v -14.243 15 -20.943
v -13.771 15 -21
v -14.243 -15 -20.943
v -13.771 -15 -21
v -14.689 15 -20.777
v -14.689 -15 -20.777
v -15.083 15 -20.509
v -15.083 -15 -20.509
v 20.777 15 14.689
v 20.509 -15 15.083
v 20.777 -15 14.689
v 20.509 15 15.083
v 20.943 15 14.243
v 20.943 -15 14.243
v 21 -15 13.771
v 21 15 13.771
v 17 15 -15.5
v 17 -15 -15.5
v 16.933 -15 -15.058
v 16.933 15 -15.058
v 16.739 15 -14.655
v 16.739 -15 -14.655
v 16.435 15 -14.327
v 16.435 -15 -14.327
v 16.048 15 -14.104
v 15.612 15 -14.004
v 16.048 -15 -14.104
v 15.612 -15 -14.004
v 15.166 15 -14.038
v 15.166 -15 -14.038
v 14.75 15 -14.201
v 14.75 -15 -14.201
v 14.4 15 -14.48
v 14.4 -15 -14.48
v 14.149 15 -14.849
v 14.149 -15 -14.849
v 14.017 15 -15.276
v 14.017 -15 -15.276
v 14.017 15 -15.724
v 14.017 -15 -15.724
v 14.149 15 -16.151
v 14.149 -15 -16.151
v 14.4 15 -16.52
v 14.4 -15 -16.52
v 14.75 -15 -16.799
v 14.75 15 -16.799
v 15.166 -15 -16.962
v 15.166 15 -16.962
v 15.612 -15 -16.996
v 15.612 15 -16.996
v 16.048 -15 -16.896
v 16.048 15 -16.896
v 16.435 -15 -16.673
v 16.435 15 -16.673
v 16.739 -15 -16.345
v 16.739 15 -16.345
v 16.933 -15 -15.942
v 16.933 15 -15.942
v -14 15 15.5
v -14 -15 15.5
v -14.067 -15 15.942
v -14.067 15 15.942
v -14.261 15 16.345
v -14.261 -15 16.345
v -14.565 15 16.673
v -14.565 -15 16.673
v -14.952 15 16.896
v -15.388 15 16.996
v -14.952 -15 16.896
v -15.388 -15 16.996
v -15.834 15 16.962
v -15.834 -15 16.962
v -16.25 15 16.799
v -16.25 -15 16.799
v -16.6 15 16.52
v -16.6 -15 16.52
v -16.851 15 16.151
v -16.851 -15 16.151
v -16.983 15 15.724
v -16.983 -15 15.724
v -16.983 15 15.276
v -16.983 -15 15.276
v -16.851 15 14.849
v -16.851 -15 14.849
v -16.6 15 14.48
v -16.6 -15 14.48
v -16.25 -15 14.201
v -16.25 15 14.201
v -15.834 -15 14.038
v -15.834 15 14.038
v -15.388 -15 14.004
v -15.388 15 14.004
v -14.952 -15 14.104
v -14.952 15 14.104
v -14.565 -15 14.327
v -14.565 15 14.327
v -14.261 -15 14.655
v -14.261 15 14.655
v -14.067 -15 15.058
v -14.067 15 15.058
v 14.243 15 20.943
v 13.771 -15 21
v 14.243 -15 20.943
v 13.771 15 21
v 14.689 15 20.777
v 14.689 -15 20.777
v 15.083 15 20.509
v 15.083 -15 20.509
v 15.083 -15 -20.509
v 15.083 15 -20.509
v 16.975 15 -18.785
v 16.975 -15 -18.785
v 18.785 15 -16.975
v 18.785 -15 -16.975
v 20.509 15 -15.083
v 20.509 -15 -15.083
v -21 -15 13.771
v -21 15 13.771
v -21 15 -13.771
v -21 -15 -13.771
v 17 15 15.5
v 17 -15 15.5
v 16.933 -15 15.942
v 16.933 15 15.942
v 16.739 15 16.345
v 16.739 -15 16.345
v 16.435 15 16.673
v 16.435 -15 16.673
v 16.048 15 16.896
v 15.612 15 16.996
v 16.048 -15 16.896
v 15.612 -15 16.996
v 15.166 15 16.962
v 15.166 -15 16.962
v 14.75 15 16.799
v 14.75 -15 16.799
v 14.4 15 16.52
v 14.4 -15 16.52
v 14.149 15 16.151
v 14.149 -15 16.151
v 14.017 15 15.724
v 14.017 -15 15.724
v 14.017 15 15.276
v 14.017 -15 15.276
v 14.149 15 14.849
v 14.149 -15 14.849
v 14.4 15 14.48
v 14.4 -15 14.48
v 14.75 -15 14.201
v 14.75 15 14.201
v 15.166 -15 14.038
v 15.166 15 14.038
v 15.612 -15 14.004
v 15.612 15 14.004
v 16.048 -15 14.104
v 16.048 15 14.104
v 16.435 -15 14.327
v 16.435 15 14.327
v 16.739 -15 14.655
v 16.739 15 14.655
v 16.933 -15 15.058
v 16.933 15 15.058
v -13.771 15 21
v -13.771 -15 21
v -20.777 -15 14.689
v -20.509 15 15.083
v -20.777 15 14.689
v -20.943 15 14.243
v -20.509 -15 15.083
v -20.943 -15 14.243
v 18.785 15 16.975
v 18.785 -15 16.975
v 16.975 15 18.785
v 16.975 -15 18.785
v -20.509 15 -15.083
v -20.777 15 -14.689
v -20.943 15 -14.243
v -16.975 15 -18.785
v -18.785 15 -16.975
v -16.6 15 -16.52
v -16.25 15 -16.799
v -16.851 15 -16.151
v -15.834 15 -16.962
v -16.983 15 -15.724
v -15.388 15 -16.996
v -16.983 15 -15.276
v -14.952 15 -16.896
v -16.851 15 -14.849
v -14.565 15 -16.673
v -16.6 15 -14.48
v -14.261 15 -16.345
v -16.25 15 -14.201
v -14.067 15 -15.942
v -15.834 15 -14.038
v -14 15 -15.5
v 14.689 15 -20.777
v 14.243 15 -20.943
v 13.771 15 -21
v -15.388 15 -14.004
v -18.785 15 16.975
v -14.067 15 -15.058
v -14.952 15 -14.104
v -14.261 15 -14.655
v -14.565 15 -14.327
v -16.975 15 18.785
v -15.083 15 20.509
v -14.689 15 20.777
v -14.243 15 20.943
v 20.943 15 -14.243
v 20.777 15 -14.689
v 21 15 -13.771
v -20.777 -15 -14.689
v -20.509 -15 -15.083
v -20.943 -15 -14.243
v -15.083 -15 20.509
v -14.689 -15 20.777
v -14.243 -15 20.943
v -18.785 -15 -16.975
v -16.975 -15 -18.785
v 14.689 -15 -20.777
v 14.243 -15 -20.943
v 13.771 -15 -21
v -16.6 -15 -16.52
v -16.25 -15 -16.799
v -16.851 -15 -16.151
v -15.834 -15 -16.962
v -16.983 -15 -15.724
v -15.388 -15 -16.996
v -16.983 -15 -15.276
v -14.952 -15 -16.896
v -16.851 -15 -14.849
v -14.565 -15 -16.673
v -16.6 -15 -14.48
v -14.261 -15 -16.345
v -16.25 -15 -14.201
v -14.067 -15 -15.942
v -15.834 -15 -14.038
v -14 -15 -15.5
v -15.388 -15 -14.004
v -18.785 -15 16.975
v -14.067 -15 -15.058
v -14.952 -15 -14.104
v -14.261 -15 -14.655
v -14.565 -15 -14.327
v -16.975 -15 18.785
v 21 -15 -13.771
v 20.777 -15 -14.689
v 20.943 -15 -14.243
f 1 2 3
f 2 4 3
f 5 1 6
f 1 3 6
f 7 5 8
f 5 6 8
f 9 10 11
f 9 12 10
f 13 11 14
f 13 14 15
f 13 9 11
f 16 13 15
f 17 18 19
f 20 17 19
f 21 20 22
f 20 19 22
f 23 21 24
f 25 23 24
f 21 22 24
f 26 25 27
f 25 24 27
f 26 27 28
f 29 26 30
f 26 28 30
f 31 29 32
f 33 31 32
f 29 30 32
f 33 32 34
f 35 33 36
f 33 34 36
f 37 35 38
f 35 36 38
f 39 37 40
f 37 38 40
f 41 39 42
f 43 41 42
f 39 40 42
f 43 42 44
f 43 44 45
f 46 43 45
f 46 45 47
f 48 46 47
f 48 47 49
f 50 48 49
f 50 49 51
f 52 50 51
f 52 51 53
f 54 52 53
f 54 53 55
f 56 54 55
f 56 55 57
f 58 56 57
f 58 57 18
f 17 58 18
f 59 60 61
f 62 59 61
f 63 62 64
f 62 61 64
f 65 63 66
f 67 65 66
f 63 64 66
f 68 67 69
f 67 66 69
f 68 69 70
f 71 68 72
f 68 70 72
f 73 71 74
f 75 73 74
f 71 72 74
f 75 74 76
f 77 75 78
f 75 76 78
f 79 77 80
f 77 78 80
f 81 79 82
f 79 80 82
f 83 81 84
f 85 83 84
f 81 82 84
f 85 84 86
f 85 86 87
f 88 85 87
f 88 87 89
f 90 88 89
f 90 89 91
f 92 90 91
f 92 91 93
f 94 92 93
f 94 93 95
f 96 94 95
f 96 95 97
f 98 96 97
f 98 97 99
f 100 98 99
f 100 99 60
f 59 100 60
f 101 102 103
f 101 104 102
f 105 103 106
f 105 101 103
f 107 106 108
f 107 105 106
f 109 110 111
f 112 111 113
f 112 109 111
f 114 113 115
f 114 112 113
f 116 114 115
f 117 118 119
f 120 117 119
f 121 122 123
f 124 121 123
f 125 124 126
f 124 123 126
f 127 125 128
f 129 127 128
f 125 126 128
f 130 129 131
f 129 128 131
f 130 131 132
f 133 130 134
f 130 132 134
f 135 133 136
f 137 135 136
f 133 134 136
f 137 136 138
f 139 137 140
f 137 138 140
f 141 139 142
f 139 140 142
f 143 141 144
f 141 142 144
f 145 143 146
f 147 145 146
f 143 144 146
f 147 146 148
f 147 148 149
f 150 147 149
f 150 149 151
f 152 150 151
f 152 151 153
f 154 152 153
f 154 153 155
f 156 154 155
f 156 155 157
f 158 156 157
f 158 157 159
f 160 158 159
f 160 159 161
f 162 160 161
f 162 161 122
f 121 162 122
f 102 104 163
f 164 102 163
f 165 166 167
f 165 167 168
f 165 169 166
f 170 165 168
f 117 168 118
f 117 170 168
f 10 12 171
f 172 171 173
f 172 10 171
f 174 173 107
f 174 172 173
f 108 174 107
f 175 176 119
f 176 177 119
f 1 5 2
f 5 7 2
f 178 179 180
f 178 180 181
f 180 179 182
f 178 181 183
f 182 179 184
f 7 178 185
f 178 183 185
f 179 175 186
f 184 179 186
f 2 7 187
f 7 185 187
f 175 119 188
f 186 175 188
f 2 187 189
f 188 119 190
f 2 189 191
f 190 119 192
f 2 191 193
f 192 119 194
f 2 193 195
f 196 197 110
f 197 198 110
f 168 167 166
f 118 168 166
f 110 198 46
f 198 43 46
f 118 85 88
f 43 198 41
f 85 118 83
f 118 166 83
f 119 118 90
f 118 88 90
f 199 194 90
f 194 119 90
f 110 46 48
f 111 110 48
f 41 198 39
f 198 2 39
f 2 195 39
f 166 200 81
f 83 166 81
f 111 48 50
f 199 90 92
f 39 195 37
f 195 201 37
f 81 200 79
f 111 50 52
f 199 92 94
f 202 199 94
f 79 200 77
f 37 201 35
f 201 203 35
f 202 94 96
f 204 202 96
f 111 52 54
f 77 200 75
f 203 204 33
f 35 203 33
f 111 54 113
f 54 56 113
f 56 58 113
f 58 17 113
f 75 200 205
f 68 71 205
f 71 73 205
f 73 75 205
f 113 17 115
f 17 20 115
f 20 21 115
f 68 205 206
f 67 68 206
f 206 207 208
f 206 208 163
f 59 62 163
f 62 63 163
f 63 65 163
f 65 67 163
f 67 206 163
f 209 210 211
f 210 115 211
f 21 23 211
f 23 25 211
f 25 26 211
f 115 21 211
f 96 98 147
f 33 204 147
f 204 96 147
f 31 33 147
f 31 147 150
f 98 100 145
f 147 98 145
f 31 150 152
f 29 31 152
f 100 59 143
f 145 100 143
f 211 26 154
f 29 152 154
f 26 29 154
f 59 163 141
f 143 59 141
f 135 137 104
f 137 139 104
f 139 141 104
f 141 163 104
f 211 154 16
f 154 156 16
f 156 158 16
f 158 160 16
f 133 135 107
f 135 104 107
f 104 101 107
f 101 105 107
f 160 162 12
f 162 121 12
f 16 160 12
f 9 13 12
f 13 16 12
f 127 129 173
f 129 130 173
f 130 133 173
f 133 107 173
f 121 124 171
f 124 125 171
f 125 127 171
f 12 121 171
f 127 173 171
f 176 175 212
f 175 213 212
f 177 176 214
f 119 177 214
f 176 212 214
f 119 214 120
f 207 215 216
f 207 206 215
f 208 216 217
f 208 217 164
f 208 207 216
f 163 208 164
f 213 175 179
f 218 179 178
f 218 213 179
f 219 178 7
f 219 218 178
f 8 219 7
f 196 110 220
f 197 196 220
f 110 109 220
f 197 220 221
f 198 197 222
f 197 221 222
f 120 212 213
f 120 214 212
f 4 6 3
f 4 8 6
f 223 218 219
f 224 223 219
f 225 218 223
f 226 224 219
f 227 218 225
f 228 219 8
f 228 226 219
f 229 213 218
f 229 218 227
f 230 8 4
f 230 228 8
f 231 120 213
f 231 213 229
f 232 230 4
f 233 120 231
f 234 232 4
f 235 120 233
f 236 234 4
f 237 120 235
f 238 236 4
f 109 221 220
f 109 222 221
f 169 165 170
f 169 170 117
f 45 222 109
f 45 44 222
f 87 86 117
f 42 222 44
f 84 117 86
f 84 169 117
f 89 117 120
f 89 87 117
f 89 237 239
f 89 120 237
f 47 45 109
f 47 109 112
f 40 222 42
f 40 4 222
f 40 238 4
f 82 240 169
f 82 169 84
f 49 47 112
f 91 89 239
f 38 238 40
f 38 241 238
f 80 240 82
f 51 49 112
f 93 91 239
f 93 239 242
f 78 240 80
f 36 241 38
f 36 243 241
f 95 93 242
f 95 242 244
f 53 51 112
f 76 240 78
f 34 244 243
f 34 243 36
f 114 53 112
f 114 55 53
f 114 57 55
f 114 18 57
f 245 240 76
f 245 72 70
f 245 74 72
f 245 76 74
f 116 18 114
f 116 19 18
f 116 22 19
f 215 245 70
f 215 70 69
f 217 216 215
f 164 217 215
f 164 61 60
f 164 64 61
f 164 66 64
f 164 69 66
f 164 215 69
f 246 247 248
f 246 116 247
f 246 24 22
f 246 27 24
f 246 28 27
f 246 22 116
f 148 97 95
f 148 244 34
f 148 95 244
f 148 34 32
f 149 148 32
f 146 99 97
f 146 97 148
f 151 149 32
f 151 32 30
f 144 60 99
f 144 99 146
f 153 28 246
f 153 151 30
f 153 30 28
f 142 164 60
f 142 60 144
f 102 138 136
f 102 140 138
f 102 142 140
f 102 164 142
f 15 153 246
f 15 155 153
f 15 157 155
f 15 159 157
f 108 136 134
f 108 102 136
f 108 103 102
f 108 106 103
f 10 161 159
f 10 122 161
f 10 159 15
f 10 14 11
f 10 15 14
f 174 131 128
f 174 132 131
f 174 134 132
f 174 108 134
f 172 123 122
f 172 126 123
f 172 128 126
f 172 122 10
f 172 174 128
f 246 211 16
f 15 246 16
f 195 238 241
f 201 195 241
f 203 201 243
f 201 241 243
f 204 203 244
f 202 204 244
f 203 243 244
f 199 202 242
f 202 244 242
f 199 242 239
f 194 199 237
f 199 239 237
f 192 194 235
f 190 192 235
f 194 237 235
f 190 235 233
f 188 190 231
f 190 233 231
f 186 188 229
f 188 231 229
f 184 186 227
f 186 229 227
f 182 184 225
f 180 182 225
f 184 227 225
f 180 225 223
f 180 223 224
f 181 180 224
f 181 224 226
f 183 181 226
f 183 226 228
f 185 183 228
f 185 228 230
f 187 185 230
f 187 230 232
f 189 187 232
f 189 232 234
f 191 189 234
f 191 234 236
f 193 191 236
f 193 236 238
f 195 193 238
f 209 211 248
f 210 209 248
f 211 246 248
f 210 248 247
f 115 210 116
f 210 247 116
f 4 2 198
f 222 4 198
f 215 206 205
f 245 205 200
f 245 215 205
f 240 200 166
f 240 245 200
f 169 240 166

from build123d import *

# Parameters (mm, degrees)
F1_DEPTH = 15
F2_R     = 2
F3_R     = 1.5
F4_DEPTH = 30.001


with BuildPart() as f1:
    # F0 (on Front) → F1 (new body, symmetric)
    with BuildSketch(Plane.XZ):
        with BuildLine():
            ThreePointArc((-14.510562, 21), (-17.890873, 17.890873), (-21, 14.510562))
            Line((-21, 14.510562), (-21, -14.510562))
            ThreePointArc((-21, -14.510562), (-17.890873, -17.890873), (-14.510562, -21))
            Line((-14.510562, -21), (14.510562, -21))
            ThreePointArc((14.510562, -21), (17.890873, -17.890873), (21, -14.510562))
            Line((21, -14.510562), (21, 14.510562))
            ThreePointArc((21, 14.510562), (17.890873, 17.890873), (14.510562, 21))
            Line((14.510562, 21), (-14.510562, 21))
        make_face()
    extrude(amount=F1_DEPTH, both=True)

    # F2
    f2_edges = [f1.edges().sort_by_distance(p)[0] for p in [
        (14.510562, 0, 21),
        (21, 0, 14.510562),
        (21, 0, -14.510562),
        (14.510562, 0, -21),
        (-14.510562, 0, -21),
        (-21, 0, -14.510562),
        (-21, 0, 14.510562),
        (-14.510562, 0, 21),
    ]]
    fillet(f2_edges, radius=F2_R)

    # F3 (on face) → F4 (cut, through all)
    with BuildSketch(Plane.XZ.offset(15)):
        with Locations((15.5, 15.5)):
            Circle(F3_R)
        with Locations((-15.5, 15.5)):
            Circle(F3_R)
        with Locations((-15.5, -15.5)):
            Circle(F3_R)
        with Locations((15.5, -15.5)):
            Circle(F3_R)
    extrude(amount=-F4_DEPTH, mode=Mode.SUBTRACT)


solid = f1.part
